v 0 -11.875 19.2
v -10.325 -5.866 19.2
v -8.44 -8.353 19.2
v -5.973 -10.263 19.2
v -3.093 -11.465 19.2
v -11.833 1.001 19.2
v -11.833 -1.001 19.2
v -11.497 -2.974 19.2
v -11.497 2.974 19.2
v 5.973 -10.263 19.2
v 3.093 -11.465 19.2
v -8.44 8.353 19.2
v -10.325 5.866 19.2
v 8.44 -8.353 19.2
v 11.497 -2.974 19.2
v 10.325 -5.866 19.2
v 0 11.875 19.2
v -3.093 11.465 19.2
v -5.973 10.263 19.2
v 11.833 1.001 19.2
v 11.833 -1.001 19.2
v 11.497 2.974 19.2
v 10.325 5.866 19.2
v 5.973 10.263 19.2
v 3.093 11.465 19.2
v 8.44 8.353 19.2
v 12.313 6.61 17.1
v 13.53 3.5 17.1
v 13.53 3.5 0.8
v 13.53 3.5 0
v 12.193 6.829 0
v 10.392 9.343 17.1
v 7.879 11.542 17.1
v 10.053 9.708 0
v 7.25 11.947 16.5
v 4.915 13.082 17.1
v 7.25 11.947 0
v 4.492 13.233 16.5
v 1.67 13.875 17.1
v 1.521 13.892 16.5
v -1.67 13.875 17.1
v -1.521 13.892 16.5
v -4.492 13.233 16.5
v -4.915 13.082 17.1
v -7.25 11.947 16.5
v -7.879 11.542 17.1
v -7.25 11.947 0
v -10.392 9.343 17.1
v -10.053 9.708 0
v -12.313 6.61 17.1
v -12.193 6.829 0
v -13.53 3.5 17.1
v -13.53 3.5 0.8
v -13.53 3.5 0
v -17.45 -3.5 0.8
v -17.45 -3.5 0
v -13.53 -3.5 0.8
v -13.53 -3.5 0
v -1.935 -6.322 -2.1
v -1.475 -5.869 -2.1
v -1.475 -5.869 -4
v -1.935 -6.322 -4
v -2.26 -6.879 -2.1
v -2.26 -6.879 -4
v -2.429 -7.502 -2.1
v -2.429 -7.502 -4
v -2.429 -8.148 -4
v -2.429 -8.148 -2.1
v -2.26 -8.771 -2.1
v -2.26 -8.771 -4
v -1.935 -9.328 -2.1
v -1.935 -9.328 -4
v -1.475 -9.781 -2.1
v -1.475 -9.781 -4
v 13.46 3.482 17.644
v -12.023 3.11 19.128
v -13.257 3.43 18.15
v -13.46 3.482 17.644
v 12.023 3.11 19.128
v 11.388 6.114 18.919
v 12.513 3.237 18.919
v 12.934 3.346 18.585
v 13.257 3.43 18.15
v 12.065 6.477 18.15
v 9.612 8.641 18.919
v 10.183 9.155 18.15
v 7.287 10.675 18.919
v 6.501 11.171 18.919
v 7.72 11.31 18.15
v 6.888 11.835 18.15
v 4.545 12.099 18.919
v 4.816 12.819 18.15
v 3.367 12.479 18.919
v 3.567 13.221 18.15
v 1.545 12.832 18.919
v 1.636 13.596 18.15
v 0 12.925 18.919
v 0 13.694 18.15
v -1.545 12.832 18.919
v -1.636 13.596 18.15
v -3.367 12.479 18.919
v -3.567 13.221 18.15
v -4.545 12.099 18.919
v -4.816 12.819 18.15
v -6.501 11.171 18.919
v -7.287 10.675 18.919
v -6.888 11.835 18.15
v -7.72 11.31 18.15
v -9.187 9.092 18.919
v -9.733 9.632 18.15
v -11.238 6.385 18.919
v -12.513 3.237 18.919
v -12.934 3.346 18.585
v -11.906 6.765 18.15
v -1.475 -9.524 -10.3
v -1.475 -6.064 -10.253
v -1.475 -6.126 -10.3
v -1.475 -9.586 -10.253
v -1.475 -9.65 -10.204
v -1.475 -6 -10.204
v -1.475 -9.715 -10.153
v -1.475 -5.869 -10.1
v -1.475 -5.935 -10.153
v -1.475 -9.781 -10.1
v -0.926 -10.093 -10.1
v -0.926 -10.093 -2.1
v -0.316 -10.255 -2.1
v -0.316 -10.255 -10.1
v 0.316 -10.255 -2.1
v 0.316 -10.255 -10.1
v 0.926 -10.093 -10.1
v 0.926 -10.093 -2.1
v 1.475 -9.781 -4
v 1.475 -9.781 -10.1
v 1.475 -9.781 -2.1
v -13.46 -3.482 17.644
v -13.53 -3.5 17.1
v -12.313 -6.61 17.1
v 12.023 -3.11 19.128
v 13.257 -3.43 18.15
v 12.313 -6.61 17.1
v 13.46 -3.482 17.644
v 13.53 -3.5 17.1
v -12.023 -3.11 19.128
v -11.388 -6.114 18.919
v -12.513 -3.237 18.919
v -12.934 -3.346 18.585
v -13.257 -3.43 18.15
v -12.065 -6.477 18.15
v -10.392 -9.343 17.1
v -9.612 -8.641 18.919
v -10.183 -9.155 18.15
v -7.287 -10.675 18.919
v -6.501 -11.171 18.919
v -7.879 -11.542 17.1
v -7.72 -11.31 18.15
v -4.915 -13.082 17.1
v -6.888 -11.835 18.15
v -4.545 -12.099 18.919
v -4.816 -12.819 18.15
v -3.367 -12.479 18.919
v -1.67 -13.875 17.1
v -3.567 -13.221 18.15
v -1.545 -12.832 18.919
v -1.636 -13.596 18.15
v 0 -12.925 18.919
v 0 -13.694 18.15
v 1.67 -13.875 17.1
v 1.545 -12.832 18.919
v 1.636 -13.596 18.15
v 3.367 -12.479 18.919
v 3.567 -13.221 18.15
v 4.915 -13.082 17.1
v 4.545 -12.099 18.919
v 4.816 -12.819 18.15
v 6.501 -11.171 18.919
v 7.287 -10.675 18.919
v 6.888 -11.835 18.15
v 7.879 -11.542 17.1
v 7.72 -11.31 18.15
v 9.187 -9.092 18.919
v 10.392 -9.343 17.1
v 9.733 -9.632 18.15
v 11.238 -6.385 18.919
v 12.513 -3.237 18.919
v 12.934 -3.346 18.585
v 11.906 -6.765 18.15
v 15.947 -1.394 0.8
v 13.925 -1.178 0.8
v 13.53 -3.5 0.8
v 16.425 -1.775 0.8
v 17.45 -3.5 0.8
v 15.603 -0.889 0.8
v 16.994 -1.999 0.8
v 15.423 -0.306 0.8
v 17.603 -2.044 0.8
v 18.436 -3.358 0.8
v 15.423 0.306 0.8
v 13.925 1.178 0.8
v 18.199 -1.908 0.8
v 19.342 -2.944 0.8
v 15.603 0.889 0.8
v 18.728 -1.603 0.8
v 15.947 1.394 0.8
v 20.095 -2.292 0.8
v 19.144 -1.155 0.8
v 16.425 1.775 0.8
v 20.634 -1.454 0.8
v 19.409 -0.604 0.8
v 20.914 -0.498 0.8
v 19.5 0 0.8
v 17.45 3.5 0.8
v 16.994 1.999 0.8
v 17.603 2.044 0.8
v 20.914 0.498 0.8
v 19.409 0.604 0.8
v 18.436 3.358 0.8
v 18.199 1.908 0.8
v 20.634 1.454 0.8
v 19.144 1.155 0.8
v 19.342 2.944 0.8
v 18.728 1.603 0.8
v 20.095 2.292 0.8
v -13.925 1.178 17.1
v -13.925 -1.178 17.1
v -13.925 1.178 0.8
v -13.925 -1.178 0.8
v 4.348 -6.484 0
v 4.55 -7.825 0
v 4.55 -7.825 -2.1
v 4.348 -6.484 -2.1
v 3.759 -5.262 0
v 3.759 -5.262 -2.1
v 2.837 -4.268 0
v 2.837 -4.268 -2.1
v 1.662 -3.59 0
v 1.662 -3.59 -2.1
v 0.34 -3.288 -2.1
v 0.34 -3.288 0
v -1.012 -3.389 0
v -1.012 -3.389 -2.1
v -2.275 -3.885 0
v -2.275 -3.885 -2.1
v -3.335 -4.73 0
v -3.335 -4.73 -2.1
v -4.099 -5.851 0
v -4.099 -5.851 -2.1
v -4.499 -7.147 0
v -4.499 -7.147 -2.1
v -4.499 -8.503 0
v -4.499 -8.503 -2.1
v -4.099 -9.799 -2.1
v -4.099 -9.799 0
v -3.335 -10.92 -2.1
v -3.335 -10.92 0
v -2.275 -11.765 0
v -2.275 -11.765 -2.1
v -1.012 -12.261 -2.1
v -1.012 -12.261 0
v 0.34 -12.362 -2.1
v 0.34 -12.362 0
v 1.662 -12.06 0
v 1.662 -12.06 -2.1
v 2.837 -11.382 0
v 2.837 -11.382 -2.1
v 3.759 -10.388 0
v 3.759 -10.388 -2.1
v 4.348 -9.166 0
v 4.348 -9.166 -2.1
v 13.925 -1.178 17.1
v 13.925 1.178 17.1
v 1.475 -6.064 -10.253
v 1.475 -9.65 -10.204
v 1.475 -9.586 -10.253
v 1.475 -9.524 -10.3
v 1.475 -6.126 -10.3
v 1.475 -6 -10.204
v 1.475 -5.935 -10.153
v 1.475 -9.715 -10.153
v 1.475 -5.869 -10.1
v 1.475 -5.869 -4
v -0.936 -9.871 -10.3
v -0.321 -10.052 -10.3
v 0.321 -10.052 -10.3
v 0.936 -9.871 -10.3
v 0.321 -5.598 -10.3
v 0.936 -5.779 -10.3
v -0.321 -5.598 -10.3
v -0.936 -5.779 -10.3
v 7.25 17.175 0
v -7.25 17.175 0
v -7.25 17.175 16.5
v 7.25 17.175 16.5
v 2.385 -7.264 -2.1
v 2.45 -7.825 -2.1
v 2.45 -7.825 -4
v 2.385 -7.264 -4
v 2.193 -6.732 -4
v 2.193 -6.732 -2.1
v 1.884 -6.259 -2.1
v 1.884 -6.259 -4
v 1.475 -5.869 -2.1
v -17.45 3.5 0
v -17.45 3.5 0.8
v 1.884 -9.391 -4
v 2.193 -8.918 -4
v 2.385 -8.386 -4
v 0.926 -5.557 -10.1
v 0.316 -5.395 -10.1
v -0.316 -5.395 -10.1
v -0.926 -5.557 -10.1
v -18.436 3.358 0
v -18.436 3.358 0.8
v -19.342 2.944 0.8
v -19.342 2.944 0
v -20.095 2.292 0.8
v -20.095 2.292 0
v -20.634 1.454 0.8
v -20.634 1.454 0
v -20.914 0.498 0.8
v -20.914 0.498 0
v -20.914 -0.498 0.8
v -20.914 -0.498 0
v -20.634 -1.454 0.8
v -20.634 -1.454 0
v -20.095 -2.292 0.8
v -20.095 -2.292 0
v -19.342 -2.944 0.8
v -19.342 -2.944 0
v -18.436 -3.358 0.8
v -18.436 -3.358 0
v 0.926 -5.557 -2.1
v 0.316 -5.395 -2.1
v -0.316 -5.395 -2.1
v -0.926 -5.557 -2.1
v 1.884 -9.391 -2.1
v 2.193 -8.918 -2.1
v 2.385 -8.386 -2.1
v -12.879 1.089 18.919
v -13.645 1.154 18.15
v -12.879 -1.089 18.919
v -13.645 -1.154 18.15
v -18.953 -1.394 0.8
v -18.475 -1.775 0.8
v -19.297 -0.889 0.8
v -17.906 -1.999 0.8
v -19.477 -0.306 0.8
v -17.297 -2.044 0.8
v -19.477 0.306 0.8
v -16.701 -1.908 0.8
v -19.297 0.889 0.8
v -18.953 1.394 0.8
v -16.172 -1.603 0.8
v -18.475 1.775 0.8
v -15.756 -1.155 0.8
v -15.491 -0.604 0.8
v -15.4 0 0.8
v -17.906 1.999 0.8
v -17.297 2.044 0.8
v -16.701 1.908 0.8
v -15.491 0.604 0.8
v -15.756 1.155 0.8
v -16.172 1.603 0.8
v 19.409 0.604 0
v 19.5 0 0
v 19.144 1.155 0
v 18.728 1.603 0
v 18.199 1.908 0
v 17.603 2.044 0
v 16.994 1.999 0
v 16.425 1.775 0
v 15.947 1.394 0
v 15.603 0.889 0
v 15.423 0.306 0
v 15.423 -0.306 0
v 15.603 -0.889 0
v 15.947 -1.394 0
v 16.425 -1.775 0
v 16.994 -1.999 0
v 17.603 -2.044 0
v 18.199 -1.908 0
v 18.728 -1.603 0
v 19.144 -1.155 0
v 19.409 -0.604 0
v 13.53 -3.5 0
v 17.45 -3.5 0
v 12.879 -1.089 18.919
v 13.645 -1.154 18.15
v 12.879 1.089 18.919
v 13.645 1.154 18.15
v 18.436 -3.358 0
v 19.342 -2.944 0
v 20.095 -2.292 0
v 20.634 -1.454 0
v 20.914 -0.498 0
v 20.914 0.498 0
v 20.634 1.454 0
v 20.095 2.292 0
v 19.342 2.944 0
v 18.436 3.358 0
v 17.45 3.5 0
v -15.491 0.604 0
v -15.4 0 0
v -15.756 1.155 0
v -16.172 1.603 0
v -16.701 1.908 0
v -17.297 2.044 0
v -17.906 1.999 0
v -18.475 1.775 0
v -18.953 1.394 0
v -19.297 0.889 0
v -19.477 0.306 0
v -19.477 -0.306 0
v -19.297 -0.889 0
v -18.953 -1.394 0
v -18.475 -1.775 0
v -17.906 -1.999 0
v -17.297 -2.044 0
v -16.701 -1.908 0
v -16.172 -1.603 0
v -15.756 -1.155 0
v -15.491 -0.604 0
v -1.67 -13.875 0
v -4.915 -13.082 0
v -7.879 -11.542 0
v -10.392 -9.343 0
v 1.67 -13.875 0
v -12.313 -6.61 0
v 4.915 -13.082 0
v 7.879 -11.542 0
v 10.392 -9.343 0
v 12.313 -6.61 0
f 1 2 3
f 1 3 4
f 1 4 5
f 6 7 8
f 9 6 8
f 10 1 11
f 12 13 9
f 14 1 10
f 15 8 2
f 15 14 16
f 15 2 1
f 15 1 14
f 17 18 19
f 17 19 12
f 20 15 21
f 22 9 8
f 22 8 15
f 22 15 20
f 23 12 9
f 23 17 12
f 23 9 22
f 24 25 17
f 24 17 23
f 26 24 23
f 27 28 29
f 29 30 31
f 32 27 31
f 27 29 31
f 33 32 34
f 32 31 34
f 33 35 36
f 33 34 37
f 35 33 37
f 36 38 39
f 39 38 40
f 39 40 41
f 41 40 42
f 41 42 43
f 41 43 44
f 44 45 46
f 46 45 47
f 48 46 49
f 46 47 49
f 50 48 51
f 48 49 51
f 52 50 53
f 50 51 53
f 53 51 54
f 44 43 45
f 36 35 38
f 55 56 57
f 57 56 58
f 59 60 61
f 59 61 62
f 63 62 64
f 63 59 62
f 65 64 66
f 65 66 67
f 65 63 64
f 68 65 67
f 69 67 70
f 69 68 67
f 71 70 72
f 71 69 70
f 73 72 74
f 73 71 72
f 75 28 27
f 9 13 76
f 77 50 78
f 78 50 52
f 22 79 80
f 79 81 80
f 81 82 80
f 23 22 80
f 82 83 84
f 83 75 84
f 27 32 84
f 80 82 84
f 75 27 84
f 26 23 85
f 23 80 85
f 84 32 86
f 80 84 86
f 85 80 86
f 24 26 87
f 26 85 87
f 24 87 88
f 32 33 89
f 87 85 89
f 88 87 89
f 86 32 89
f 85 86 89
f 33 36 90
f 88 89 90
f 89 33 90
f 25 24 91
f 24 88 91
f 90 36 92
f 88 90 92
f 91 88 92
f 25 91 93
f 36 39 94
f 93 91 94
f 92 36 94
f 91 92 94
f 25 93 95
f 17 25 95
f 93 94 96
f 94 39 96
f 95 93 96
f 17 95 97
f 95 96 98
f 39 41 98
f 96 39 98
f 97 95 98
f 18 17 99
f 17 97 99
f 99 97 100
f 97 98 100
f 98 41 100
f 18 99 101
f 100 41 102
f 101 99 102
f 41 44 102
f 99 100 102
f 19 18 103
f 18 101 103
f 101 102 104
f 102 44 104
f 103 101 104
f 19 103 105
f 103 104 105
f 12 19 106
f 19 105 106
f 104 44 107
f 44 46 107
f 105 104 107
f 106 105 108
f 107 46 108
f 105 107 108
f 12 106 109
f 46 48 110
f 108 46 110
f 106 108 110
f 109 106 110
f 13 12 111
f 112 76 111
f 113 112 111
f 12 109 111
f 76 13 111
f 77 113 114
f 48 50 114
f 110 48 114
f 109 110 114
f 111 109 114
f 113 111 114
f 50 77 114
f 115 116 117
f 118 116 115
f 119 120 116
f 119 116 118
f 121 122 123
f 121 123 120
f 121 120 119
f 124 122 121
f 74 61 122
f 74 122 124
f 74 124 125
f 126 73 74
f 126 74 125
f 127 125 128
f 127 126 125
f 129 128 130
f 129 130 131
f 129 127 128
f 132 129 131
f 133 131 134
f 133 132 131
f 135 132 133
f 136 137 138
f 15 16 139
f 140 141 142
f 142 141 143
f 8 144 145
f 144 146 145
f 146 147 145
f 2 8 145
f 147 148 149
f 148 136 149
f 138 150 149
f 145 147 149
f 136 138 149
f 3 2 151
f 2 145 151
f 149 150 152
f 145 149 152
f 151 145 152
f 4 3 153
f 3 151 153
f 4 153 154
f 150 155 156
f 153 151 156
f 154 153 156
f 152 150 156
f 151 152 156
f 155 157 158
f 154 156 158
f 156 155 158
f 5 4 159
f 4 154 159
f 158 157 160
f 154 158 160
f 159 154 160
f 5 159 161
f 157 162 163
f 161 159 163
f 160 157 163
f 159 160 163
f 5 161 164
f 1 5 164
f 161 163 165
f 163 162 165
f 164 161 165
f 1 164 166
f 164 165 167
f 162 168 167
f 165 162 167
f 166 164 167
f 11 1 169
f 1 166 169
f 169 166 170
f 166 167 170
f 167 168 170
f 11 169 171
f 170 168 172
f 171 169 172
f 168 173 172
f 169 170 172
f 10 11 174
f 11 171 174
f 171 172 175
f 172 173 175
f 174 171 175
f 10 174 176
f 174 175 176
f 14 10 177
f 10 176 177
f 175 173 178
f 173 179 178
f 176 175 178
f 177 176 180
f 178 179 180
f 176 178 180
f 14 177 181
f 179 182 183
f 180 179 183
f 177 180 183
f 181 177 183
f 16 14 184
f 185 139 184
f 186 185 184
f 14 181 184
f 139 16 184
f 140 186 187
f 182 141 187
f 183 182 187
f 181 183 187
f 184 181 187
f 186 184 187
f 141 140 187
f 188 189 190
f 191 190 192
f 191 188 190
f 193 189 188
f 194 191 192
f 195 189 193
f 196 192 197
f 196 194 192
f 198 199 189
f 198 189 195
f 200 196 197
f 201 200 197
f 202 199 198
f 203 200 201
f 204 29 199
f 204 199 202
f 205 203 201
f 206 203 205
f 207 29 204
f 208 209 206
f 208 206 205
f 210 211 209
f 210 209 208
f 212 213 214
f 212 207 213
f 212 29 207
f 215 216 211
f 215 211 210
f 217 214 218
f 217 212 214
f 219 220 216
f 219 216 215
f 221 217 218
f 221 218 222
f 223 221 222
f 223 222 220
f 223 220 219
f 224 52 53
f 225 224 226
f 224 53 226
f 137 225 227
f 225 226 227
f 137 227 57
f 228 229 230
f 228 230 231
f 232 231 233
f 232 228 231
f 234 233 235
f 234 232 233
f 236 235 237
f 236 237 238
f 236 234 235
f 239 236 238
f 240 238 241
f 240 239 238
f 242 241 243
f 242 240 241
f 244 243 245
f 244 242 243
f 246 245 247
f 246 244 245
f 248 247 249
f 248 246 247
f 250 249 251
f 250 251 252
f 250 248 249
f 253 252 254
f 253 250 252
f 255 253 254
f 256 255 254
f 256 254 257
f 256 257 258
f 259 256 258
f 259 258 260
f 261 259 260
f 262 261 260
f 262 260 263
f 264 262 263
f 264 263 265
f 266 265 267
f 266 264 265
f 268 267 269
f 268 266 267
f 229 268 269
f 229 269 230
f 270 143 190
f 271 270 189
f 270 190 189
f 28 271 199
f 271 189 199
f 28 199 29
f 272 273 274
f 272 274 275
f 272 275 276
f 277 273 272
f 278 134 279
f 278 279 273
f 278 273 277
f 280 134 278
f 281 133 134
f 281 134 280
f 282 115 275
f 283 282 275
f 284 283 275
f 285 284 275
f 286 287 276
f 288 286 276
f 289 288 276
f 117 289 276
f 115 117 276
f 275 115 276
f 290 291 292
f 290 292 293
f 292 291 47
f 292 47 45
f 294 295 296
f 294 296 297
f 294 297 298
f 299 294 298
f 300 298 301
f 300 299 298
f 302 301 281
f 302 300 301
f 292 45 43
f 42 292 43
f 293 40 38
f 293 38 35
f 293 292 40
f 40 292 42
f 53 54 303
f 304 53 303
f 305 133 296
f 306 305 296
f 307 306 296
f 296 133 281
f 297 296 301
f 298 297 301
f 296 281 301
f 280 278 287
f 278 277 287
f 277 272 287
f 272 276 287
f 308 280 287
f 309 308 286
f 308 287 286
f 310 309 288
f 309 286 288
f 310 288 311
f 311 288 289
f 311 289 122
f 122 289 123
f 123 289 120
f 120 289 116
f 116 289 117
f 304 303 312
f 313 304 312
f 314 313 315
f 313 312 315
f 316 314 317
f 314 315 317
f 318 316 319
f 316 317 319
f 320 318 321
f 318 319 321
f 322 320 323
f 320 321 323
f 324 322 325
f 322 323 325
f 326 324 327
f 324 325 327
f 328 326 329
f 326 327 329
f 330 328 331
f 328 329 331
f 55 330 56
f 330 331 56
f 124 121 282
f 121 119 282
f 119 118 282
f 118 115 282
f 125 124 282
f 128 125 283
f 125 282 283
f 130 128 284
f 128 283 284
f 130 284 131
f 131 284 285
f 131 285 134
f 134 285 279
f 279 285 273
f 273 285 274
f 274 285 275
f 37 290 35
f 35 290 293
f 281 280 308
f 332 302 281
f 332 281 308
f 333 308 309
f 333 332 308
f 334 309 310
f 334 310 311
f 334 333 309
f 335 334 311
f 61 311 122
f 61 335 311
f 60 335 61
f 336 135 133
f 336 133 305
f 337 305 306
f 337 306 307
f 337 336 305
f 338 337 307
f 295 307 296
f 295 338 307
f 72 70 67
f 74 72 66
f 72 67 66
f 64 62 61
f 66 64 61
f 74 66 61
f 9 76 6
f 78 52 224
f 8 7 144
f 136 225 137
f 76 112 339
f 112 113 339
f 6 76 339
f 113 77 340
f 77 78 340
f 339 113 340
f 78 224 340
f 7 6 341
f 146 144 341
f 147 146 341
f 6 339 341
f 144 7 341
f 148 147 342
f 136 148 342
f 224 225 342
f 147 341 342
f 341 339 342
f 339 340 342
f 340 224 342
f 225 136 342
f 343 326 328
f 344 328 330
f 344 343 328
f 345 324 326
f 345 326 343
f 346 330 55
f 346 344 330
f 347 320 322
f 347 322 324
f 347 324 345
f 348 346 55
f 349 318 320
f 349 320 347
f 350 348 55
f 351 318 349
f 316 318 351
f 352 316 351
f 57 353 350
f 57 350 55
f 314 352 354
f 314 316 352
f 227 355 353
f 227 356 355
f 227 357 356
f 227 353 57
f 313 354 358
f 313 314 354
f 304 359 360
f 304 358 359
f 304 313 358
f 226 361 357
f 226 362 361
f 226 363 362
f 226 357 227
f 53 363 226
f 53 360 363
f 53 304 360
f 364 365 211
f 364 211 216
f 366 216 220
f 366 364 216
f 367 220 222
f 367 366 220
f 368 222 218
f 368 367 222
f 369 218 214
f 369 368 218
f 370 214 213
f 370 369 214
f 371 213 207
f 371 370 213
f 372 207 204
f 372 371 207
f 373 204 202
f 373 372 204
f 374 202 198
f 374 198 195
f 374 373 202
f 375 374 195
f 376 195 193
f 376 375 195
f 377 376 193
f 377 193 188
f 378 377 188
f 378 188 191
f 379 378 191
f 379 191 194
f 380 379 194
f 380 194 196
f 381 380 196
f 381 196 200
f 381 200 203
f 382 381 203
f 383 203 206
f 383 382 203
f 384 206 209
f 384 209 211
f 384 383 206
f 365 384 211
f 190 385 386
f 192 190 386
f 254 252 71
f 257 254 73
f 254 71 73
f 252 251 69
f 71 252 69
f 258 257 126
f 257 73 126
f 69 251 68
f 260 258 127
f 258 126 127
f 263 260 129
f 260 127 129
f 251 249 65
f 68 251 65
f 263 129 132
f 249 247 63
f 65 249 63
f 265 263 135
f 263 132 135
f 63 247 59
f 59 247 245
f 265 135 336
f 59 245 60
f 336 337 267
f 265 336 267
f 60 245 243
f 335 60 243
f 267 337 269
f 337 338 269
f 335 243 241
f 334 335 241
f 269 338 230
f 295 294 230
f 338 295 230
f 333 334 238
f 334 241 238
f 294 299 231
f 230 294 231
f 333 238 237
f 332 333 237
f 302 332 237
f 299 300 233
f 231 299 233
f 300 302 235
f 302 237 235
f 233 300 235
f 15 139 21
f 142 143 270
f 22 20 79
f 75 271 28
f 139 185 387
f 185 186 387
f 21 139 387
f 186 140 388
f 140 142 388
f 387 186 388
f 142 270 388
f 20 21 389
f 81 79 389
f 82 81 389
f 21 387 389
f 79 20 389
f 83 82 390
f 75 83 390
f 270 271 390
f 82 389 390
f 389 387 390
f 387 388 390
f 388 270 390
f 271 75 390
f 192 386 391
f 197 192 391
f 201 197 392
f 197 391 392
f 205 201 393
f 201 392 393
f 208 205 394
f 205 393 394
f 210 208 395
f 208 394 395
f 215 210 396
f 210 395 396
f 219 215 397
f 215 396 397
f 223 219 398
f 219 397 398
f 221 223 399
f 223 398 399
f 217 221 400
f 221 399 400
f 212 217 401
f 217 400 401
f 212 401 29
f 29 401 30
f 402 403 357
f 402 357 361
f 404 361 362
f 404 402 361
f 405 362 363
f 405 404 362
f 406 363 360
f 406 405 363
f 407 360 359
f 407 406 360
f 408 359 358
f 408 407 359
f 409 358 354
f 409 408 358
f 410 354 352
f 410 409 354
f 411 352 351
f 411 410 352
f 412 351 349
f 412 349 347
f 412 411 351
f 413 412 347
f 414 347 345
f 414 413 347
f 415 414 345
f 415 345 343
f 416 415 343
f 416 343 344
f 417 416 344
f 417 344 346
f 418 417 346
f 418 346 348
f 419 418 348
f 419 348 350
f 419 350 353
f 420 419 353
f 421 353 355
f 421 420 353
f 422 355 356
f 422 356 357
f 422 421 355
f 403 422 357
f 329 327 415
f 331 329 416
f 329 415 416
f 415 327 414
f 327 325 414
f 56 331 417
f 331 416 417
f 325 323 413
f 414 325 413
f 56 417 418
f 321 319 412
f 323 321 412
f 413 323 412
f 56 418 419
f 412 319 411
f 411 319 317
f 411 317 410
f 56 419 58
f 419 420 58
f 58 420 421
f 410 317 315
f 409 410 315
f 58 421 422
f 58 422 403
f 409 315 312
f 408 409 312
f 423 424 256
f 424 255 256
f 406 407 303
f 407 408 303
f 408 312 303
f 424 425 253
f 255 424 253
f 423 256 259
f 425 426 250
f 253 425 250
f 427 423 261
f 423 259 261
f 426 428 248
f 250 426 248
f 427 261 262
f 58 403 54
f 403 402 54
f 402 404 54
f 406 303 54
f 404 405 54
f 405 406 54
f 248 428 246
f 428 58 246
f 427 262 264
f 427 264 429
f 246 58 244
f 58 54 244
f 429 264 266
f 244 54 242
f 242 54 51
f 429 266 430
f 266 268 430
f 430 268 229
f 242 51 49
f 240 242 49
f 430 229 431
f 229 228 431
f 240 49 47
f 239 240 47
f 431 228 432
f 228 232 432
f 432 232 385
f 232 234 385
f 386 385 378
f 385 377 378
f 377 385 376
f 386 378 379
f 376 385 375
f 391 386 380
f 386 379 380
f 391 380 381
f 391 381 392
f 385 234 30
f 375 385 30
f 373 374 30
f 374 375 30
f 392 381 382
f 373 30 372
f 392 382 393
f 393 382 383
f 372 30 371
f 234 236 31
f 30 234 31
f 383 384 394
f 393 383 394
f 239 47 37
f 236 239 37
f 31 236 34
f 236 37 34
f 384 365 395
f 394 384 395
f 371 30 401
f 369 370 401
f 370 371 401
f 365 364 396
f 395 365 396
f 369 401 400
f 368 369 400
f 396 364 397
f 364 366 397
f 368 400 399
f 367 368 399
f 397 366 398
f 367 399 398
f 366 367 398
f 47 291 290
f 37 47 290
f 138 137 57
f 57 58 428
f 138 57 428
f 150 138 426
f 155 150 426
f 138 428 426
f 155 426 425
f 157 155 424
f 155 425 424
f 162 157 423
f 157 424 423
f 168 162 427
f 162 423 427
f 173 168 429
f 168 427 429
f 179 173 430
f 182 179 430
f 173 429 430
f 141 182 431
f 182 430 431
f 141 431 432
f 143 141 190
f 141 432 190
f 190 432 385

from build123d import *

# Parameters (mm, degrees)
F0_R      = 2.05
F1_DEPTH  = 0.8
F2_DEPTH  = 19.2
F3_R      = 4.55
F4_DEPTH  = 2.1
F5_DEPTH  = 4
F6_DEPTH  = 10.3
F8_W      = 14.5
F8_H      = 16.5
F12_DEPTH = 0.65
F13_R     = 2.1
F14_SIZE  = 0.2


with BuildPart() as f1:
    # F0 (on Top) → F1 (new body)
    with BuildSketch(Plane.XY):
        with BuildLine():
            ThreePointArc((-13.5296202829, -3.5), (-13.975, 0), (-13.5296202829, 3.5))
            Line((-13.5296202829, 3.5), (-17.45, 3.5))
            ThreePointArc((-17.45, 3.5), (-20.95, 0), (-17.45, -3.5))
            Line((-17.45, -3.5), (-13.5296202829, -3.5))
        make_face()
        with Locations((-17.45, 0)):
            Circle(F0_R, mode=Mode.SUBTRACT)
    extrude(amount=F1_DEPTH)



with BuildPart() as f1b:
    # F0 (on Top) → F1, piece 2 (new body)
    with BuildSketch(Plane.XY):
        with BuildLine():
            Line((17.45, 3.5), (13.5296202829, 3.5))
            ThreePointArc((13.5296202829, 3.5), (13.975, 0), (13.5296202829, -3.5))
            Line((13.5296202829, -3.5), (17.45, -3.5))
            ThreePointArc((17.45, -3.5), (20.95, 0), (17.45, 3.5))
        make_face()
        with Locations((17.45, 0)):
            Circle(F0_R, mode=Mode.SUBTRACT)
    extrude(amount=F1_DEPTH)


with BuildPart() as f1_1:
    add(f1.part)

    add(f1b.part)  # F2 merges F1b
    # F0 (on Top) → F2 (join)
    with BuildSketch(Plane.XY):
        with BuildLine():
            ThreePointArc((13.5296202829, -3.5), (13.975, 0), (13.5296202829, 3.5))
            ThreePointArc((13.5296202829, 3.5), (0, 13.975), (-13.5296202829, 3.5))
            ThreePointArc((-13.5296202829, 3.5), (-13.975, 0), (-13.5296202829, -3.5))
            ThreePointArc((-13.5296202829, -3.5), (0, -13.975), (13.5296202829, -3.5))
        make_face()
    extrude(amount=F2_DEPTH)

    # F3 (on Top) → F4 (join)
    with BuildSketch(Plane.XY):
        with Locations((0, -7.825)):
            Circle(F3_R)
        with BuildLine():
            ThreePointArc((1.475, -5.8687599841), (2.1927437151, -6.7321253503), (2.45, -7.825))
            ThreePointArc((2.45, -7.825), (2.1927437151, -8.9178746497), (1.475, -9.7812400159))
            ThreePointArc((1.475, -9.7812400159), (0, -10.275), (-1.475, -9.7812400159))
            ThreePointArc((-1.475, -9.7812400159), (-2.45, -7.825), (-1.475, -5.8687599841))
            ThreePointArc((-1.475, -5.8687599841), (0, -5.375), (1.475, -5.8687599841))
        make_face(mode=Mode.SUBTRACT)
    extrude(amount=-F4_DEPTH)

    # F3 (on Top) → F5 (join)
    with BuildSketch(Plane.XY):
        with BuildLine():
            ThreePointArc((1.475, -9.7812400159), (2.1927437151, -8.9178746497), (2.45, -7.825))
            ThreePointArc((2.45, -7.825), (2.1927437151, -6.7321253503), (1.475, -5.8687599841))
            Line((1.475, -5.8687599841), (1.475, -9.7812400159))
        make_face()
        with BuildLine():
            Line((1.475, -9.7812400159), (1.475, -5.8687599841))
            ThreePointArc((1.475, -5.8687599841), (0, -5.375), (-1.475, -5.8687599841))
            Line((-1.475, -5.8687599841), (-1.475, -9.7812400159))
            ThreePointArc((-1.475, -9.7812400159), (0, -10.275), (1.475, -9.7812400159))
        make_face()
        with BuildLine():
            Line((-1.475, -9.7812400159), (-1.475, -5.8687599841))
            ThreePointArc((-1.475, -5.8687599841), (-2.45, -7.825), (-1.475, -9.7812400159))
        make_face()
    extrude(amount=-F5_DEPTH)

    # F3 (on Top) → F6 (join)
    with BuildSketch(Plane.XY):
        with BuildLine():
            Line((1.475, -9.7812400159), (1.475, -5.8687599841))
            ThreePointArc((1.475, -5.8687599841), (0, -5.375), (-1.475, -5.8687599841))
            Line((-1.475, -5.8687599841), (-1.475, -9.7812400159))
            ThreePointArc((-1.475, -9.7812400159), (0, -10.275), (1.475, -9.7812400159))
        make_face()
    extrude(amount=-F6_DEPTH)

    # F8 (on offset) → F9 (join, up to the next surface of F1)
    with BuildSketch(Plane.XZ.offset(-17.175)):
        with Locations((0, 8.25)):
            Rectangle(F8_W, F8_H)
    extrude(until=Until.NEXT)

    # F11 (on offset) → F12 (cut, through all)
    with BuildSketch(Plane.XY.offset(17.15)):
        with BuildLine():
            Line((-8.625, 12.9959083299), (-8.625, 11.5))
            ThreePointArc((-8.625, 11.5), (-7.9506110955, 11.9761599943), (-7.25, 12.4128209928))
            Line((-7.25, 12.4128209928), (-7.25, 13.8205759578))
            ThreePointArc((-7.25, 13.8205759578), (-7.9482026537, 13.4260870893), (-8.625, 12.9959083299))
        make_face()
        with BuildLine():
            ThreePointArc((7.25, 12.4128209928), (7.9506110955, 11.9761599943), (8.625, 11.5))
            Line((8.625, 11.5), (8.625, 12.9959083299))
            ThreePointArc((8.625, 12.9959083299), (7.9482026537, 13.4260870893), (7.25, 13.8205759578))
            Line((7.25, 13.8205759578), (7.25, 12.4128209928))
        make_face()
    extrude(amount=-F12_DEPTH, mode=Mode.SUBTRACT)

    # F13
    f13_edges = [f1_1.edges().sort_by_distance(p)[0] for p in [
        (-13.52962, -3.5, 19.2),
    ]]
    fillet(f13_edges, radius=F13_R)

    # F14
    f14_edges = [f1_1.edges().sort_by_distance(p)[0] for p in [
        (0, -5.375, -10.3),
        (0, -10.275, -10.3),
    ]]
    chamfer(f14_edges, length=F14_SIZE)


solid = f1_1.part
